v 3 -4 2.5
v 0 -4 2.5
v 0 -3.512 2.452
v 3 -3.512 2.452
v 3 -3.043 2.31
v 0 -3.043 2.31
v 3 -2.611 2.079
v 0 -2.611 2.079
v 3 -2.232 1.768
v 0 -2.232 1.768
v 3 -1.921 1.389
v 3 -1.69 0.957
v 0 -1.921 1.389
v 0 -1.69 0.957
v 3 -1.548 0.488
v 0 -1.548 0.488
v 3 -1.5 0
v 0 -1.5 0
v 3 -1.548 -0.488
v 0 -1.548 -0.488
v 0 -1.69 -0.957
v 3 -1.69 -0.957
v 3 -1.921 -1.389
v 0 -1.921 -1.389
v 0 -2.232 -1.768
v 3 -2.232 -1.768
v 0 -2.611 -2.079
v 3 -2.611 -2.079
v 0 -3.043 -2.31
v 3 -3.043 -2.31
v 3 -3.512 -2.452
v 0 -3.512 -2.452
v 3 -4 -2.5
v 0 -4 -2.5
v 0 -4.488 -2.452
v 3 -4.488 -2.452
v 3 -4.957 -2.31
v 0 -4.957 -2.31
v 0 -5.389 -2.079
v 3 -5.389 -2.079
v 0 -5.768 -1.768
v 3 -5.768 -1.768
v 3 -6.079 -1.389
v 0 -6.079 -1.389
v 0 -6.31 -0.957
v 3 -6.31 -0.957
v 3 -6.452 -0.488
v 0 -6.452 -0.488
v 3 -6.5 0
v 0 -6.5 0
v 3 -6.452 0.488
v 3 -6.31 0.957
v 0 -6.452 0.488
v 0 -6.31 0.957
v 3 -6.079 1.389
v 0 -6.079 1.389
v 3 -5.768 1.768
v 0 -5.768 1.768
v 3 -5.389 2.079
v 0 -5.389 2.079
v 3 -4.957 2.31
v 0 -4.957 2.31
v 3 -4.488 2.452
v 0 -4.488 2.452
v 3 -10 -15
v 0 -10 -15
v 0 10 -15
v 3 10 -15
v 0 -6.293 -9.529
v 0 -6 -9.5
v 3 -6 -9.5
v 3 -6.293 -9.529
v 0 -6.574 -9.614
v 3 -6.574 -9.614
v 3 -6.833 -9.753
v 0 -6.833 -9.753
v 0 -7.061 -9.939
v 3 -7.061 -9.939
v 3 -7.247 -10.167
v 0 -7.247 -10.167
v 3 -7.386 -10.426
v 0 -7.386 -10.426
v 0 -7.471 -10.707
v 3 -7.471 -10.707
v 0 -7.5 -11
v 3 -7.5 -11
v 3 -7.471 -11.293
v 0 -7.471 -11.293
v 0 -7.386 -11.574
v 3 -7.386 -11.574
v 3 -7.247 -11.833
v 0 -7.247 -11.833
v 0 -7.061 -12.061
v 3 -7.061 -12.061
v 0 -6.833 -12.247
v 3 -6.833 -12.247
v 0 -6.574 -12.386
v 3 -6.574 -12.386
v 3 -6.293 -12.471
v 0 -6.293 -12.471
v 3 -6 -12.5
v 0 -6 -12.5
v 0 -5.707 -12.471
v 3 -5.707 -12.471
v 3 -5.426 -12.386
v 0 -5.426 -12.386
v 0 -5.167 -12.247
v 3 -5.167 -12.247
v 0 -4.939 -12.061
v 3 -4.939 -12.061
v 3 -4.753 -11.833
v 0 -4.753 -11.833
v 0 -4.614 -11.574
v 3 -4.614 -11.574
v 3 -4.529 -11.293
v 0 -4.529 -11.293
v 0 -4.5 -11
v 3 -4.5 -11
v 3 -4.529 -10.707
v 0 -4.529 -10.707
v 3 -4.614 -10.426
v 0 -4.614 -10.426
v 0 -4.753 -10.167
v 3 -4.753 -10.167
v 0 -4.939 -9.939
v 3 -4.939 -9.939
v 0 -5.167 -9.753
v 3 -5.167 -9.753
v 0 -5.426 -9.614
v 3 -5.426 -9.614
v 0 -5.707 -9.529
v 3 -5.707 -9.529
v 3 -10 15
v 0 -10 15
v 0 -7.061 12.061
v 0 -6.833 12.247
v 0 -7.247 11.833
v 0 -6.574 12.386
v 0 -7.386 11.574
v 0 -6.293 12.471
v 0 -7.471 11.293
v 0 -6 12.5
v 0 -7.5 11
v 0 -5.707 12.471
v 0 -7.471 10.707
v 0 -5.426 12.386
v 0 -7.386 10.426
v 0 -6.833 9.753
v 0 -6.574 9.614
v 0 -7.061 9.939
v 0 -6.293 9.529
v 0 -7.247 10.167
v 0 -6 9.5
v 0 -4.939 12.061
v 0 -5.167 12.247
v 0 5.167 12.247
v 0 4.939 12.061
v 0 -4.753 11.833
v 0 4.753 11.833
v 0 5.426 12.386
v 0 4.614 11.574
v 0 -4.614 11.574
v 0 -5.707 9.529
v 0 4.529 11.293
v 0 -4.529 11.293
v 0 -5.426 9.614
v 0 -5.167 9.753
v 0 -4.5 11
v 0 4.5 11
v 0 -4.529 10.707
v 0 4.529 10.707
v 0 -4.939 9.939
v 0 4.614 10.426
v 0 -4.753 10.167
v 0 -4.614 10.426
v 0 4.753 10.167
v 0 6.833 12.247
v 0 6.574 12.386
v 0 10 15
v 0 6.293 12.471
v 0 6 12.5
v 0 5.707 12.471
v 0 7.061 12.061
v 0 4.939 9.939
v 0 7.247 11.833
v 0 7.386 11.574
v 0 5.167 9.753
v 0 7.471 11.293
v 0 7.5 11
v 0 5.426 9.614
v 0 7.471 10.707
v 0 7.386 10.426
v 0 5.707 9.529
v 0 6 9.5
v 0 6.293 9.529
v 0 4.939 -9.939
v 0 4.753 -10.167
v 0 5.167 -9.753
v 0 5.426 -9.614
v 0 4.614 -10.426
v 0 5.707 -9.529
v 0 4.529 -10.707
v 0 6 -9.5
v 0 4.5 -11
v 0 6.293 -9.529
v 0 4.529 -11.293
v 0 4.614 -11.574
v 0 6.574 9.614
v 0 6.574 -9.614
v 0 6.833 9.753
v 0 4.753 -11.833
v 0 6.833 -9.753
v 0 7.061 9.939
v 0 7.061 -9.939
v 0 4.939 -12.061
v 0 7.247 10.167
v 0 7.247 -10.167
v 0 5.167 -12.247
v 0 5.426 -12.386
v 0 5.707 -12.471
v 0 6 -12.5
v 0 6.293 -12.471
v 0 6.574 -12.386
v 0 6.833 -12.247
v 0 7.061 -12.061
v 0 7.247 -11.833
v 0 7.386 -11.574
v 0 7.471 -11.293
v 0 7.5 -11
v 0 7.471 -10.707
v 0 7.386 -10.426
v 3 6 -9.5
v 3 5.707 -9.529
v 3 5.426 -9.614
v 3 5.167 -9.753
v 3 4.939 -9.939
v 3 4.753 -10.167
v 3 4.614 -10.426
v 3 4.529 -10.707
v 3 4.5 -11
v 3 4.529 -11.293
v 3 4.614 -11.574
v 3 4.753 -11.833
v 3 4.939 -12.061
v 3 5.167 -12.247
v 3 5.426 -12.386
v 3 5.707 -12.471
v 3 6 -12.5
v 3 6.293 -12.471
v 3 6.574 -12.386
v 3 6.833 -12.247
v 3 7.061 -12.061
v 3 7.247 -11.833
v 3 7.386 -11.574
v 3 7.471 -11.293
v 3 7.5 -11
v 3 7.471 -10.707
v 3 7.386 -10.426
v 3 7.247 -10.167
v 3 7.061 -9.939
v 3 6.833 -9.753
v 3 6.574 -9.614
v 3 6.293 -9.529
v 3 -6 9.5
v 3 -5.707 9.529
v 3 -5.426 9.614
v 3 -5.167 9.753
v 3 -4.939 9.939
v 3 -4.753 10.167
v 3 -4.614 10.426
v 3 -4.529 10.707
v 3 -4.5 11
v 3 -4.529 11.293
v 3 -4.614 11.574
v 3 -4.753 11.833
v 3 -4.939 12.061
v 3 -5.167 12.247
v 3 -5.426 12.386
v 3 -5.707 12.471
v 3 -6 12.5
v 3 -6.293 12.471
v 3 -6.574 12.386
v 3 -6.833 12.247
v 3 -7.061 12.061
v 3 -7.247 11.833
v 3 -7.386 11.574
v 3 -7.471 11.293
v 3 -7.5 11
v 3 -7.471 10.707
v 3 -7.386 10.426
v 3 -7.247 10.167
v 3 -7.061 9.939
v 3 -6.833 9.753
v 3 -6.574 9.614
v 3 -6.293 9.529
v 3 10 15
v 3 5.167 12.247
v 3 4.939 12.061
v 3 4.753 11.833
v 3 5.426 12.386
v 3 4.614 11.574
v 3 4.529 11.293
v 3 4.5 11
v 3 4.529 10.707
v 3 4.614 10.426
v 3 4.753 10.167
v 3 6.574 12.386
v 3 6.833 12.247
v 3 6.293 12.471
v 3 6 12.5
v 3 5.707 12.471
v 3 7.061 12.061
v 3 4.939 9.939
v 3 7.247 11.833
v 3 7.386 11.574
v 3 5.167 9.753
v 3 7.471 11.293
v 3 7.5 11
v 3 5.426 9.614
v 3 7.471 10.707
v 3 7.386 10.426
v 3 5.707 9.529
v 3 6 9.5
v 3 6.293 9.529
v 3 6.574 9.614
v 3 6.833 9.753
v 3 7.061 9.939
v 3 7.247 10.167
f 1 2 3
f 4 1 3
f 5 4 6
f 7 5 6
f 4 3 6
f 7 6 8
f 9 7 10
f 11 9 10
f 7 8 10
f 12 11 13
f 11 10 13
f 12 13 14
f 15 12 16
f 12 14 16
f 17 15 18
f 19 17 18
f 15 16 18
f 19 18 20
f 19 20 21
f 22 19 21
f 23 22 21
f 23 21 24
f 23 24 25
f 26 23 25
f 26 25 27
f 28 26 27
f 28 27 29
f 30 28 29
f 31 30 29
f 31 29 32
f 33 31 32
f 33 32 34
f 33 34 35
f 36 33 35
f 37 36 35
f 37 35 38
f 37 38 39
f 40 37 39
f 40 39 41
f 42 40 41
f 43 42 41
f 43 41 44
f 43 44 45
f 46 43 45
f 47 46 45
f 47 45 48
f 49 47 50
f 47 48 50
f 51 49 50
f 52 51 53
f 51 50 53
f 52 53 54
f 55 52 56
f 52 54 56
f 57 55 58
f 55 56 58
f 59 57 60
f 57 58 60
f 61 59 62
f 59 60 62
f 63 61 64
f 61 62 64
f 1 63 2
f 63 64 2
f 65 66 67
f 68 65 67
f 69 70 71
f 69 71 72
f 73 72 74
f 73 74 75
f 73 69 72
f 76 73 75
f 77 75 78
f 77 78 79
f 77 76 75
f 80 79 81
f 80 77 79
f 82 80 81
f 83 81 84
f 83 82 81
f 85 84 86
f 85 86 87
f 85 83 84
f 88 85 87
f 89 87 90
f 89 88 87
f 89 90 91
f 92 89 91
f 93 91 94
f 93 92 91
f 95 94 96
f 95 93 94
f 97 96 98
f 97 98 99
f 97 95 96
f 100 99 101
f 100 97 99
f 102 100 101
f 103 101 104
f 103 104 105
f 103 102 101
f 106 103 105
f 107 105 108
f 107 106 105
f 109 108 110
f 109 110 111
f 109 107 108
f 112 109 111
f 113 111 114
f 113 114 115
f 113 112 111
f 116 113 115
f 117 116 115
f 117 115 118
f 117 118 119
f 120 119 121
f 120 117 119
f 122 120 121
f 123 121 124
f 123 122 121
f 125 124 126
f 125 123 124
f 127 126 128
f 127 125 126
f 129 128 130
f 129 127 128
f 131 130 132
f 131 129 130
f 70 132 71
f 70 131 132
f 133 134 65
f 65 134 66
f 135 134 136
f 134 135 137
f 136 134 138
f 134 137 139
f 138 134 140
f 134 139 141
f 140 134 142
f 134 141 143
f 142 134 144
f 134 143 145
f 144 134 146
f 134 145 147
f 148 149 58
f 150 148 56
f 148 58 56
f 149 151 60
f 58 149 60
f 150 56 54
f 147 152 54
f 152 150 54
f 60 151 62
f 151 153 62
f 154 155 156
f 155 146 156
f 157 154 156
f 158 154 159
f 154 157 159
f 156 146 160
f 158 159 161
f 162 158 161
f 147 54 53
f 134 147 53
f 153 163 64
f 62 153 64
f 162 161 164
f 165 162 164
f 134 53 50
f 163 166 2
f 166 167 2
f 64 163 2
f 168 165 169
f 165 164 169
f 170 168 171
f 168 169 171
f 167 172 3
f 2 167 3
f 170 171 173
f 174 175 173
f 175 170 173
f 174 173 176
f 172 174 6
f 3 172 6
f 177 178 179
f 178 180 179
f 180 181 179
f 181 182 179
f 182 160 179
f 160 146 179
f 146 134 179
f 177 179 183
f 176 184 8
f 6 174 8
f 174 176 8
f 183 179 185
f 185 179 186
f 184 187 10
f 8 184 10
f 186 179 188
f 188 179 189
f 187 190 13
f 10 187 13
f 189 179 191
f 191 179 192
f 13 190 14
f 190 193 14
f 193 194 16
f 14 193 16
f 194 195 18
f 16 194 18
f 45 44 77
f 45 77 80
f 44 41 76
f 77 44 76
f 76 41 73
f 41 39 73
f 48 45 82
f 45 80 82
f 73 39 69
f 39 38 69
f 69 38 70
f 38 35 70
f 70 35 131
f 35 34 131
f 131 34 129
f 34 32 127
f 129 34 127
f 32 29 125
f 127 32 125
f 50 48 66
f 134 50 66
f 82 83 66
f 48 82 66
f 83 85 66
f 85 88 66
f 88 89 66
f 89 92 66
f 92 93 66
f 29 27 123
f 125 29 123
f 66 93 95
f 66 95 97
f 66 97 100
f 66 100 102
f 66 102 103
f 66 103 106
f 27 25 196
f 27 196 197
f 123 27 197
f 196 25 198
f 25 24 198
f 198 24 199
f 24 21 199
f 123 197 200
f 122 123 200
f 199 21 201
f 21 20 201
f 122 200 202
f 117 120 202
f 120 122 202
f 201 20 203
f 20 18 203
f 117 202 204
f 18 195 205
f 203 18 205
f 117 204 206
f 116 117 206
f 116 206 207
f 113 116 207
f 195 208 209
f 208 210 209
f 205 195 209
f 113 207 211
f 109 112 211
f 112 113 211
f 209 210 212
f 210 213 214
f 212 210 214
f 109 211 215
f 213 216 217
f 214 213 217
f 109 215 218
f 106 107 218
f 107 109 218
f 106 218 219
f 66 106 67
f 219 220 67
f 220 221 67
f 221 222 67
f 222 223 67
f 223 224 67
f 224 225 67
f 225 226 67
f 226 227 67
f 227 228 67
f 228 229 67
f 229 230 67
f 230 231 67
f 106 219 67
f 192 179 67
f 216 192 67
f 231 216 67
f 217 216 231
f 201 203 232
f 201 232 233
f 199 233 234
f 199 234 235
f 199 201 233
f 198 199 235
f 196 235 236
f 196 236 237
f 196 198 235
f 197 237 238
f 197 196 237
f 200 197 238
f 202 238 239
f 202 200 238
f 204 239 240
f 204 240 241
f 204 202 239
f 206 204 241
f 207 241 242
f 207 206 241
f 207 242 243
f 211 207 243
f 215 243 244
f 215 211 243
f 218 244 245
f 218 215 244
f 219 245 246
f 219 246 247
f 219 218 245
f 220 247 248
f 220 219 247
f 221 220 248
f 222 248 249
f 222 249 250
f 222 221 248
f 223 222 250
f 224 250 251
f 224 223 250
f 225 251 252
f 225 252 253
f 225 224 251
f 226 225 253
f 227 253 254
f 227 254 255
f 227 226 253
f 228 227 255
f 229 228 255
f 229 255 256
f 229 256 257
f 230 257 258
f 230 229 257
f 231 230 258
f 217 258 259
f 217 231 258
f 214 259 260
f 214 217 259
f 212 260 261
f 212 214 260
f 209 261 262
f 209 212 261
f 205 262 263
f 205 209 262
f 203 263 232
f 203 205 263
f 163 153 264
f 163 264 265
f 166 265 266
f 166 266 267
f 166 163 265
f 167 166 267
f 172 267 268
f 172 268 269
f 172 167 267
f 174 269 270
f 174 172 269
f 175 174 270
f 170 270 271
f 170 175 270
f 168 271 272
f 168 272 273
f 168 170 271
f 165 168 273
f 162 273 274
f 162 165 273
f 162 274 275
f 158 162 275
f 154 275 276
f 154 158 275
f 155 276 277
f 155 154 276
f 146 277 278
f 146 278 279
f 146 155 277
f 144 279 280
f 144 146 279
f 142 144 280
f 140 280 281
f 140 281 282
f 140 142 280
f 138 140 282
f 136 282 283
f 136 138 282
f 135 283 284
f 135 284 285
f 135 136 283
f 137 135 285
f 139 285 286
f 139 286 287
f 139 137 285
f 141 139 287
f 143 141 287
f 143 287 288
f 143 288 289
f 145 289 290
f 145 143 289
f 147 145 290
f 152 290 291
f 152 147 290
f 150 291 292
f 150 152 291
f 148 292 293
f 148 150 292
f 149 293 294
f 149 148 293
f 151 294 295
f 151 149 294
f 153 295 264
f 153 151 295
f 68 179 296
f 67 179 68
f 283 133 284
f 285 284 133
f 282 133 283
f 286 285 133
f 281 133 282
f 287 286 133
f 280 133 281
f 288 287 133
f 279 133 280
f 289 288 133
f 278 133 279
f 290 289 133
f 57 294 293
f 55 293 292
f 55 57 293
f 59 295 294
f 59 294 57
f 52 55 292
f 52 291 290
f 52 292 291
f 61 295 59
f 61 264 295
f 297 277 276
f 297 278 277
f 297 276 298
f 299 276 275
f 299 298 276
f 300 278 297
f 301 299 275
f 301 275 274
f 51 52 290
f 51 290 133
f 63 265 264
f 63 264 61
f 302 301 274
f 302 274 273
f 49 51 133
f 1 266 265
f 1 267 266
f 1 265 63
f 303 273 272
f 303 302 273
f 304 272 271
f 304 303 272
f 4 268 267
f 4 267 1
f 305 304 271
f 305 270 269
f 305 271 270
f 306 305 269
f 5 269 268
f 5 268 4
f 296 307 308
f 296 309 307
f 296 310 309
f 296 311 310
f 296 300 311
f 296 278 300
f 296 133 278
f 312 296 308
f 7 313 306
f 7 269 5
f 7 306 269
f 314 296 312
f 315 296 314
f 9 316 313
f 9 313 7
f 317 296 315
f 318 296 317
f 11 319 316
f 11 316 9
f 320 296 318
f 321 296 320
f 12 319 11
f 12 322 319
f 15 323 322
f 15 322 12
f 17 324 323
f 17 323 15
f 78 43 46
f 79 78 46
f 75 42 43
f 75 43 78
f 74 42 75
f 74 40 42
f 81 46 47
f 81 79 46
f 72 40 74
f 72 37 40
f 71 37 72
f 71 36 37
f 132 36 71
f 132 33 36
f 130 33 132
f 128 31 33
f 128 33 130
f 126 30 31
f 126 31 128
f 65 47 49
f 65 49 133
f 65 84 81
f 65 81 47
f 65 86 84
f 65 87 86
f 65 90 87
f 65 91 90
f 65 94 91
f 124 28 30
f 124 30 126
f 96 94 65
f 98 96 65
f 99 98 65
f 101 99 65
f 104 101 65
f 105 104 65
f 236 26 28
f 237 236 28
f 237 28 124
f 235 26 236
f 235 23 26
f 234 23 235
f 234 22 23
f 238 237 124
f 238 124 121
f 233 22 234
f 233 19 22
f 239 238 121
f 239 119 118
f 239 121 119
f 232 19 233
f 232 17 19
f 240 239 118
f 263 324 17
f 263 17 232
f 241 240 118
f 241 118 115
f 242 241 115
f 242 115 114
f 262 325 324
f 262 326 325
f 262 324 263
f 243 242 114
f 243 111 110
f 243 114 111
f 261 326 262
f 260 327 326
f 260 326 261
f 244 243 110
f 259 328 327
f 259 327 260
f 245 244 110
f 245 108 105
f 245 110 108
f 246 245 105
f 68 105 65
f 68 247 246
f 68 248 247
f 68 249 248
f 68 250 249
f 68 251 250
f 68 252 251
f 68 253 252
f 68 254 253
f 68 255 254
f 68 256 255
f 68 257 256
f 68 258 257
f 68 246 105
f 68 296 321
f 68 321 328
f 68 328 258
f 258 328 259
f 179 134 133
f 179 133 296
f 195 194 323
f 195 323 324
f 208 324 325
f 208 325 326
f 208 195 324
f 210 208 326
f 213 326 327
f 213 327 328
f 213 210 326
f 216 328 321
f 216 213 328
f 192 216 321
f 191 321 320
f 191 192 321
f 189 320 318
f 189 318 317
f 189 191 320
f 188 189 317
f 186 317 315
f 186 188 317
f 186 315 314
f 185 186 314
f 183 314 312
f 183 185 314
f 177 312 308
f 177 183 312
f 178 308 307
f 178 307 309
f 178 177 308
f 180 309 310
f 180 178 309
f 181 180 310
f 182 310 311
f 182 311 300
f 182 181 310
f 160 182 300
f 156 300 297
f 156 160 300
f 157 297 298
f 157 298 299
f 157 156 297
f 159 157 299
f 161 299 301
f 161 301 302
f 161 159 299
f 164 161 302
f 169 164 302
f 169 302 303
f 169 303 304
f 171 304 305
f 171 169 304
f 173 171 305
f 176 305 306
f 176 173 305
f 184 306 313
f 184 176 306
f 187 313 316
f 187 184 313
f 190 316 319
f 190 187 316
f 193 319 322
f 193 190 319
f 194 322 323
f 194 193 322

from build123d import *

# Parameters (mm, degrees)
SKETCH_1_W          = 30
SKETCH_1_H          = 20
SKETCH_1_R          = 1.5
EXTRUDE_1_DEPTH     = 3
CUT_EXTRUDE_1_REACH = 20.276
SKETCH_2_R          = 2.5


with BuildPart() as part:
    # 草图1 → 凸台-拉伸1 (new body)
    with BuildSketch(Plane(origin=(0, 0, 0), x_dir=(0, 0, -1), z_dir=(1, 0, 0))):
        Rectangle(SKETCH_1_W, SKETCH_1_H)
        with Locations((-11, 6)):
            Circle(SKETCH_1_R, mode=Mode.SUBTRACT)
        with Locations((-11, -6)):
            Circle(SKETCH_1_R, mode=Mode.SUBTRACT)
        with Locations(Location((11, -6, 0), (0, 0, 180))):
            Circle(SKETCH_1_R, mode=Mode.SUBTRACT)
        with Locations(Location((11, 6, 0), (0, 0, 180))):
            Circle(SKETCH_1_R, mode=Mode.SUBTRACT)
    extrude(amount=EXTRUDE_1_DEPTH)

    # 草图2 → 切除-拉伸1 (cut, up to next)
    with BuildSketch(Plane.ZY, mode=Mode.PRIVATE) as cut_extrude_1_sk1:
        with Locations((0, -4)):
            Circle(SKETCH_2_R)
    cut_extrude_1_tool1 = extrude(cut_extrude_1_sk1.sketch, amount=-CUT_EXTRUDE_1_REACH, mode=Mode.PRIVATE) & part.part
    add(cut_extrude_1_tool1.solids().sort_by_distance((0, -4, 0))[0], mode=Mode.SUBTRACT)


solid = part.part
